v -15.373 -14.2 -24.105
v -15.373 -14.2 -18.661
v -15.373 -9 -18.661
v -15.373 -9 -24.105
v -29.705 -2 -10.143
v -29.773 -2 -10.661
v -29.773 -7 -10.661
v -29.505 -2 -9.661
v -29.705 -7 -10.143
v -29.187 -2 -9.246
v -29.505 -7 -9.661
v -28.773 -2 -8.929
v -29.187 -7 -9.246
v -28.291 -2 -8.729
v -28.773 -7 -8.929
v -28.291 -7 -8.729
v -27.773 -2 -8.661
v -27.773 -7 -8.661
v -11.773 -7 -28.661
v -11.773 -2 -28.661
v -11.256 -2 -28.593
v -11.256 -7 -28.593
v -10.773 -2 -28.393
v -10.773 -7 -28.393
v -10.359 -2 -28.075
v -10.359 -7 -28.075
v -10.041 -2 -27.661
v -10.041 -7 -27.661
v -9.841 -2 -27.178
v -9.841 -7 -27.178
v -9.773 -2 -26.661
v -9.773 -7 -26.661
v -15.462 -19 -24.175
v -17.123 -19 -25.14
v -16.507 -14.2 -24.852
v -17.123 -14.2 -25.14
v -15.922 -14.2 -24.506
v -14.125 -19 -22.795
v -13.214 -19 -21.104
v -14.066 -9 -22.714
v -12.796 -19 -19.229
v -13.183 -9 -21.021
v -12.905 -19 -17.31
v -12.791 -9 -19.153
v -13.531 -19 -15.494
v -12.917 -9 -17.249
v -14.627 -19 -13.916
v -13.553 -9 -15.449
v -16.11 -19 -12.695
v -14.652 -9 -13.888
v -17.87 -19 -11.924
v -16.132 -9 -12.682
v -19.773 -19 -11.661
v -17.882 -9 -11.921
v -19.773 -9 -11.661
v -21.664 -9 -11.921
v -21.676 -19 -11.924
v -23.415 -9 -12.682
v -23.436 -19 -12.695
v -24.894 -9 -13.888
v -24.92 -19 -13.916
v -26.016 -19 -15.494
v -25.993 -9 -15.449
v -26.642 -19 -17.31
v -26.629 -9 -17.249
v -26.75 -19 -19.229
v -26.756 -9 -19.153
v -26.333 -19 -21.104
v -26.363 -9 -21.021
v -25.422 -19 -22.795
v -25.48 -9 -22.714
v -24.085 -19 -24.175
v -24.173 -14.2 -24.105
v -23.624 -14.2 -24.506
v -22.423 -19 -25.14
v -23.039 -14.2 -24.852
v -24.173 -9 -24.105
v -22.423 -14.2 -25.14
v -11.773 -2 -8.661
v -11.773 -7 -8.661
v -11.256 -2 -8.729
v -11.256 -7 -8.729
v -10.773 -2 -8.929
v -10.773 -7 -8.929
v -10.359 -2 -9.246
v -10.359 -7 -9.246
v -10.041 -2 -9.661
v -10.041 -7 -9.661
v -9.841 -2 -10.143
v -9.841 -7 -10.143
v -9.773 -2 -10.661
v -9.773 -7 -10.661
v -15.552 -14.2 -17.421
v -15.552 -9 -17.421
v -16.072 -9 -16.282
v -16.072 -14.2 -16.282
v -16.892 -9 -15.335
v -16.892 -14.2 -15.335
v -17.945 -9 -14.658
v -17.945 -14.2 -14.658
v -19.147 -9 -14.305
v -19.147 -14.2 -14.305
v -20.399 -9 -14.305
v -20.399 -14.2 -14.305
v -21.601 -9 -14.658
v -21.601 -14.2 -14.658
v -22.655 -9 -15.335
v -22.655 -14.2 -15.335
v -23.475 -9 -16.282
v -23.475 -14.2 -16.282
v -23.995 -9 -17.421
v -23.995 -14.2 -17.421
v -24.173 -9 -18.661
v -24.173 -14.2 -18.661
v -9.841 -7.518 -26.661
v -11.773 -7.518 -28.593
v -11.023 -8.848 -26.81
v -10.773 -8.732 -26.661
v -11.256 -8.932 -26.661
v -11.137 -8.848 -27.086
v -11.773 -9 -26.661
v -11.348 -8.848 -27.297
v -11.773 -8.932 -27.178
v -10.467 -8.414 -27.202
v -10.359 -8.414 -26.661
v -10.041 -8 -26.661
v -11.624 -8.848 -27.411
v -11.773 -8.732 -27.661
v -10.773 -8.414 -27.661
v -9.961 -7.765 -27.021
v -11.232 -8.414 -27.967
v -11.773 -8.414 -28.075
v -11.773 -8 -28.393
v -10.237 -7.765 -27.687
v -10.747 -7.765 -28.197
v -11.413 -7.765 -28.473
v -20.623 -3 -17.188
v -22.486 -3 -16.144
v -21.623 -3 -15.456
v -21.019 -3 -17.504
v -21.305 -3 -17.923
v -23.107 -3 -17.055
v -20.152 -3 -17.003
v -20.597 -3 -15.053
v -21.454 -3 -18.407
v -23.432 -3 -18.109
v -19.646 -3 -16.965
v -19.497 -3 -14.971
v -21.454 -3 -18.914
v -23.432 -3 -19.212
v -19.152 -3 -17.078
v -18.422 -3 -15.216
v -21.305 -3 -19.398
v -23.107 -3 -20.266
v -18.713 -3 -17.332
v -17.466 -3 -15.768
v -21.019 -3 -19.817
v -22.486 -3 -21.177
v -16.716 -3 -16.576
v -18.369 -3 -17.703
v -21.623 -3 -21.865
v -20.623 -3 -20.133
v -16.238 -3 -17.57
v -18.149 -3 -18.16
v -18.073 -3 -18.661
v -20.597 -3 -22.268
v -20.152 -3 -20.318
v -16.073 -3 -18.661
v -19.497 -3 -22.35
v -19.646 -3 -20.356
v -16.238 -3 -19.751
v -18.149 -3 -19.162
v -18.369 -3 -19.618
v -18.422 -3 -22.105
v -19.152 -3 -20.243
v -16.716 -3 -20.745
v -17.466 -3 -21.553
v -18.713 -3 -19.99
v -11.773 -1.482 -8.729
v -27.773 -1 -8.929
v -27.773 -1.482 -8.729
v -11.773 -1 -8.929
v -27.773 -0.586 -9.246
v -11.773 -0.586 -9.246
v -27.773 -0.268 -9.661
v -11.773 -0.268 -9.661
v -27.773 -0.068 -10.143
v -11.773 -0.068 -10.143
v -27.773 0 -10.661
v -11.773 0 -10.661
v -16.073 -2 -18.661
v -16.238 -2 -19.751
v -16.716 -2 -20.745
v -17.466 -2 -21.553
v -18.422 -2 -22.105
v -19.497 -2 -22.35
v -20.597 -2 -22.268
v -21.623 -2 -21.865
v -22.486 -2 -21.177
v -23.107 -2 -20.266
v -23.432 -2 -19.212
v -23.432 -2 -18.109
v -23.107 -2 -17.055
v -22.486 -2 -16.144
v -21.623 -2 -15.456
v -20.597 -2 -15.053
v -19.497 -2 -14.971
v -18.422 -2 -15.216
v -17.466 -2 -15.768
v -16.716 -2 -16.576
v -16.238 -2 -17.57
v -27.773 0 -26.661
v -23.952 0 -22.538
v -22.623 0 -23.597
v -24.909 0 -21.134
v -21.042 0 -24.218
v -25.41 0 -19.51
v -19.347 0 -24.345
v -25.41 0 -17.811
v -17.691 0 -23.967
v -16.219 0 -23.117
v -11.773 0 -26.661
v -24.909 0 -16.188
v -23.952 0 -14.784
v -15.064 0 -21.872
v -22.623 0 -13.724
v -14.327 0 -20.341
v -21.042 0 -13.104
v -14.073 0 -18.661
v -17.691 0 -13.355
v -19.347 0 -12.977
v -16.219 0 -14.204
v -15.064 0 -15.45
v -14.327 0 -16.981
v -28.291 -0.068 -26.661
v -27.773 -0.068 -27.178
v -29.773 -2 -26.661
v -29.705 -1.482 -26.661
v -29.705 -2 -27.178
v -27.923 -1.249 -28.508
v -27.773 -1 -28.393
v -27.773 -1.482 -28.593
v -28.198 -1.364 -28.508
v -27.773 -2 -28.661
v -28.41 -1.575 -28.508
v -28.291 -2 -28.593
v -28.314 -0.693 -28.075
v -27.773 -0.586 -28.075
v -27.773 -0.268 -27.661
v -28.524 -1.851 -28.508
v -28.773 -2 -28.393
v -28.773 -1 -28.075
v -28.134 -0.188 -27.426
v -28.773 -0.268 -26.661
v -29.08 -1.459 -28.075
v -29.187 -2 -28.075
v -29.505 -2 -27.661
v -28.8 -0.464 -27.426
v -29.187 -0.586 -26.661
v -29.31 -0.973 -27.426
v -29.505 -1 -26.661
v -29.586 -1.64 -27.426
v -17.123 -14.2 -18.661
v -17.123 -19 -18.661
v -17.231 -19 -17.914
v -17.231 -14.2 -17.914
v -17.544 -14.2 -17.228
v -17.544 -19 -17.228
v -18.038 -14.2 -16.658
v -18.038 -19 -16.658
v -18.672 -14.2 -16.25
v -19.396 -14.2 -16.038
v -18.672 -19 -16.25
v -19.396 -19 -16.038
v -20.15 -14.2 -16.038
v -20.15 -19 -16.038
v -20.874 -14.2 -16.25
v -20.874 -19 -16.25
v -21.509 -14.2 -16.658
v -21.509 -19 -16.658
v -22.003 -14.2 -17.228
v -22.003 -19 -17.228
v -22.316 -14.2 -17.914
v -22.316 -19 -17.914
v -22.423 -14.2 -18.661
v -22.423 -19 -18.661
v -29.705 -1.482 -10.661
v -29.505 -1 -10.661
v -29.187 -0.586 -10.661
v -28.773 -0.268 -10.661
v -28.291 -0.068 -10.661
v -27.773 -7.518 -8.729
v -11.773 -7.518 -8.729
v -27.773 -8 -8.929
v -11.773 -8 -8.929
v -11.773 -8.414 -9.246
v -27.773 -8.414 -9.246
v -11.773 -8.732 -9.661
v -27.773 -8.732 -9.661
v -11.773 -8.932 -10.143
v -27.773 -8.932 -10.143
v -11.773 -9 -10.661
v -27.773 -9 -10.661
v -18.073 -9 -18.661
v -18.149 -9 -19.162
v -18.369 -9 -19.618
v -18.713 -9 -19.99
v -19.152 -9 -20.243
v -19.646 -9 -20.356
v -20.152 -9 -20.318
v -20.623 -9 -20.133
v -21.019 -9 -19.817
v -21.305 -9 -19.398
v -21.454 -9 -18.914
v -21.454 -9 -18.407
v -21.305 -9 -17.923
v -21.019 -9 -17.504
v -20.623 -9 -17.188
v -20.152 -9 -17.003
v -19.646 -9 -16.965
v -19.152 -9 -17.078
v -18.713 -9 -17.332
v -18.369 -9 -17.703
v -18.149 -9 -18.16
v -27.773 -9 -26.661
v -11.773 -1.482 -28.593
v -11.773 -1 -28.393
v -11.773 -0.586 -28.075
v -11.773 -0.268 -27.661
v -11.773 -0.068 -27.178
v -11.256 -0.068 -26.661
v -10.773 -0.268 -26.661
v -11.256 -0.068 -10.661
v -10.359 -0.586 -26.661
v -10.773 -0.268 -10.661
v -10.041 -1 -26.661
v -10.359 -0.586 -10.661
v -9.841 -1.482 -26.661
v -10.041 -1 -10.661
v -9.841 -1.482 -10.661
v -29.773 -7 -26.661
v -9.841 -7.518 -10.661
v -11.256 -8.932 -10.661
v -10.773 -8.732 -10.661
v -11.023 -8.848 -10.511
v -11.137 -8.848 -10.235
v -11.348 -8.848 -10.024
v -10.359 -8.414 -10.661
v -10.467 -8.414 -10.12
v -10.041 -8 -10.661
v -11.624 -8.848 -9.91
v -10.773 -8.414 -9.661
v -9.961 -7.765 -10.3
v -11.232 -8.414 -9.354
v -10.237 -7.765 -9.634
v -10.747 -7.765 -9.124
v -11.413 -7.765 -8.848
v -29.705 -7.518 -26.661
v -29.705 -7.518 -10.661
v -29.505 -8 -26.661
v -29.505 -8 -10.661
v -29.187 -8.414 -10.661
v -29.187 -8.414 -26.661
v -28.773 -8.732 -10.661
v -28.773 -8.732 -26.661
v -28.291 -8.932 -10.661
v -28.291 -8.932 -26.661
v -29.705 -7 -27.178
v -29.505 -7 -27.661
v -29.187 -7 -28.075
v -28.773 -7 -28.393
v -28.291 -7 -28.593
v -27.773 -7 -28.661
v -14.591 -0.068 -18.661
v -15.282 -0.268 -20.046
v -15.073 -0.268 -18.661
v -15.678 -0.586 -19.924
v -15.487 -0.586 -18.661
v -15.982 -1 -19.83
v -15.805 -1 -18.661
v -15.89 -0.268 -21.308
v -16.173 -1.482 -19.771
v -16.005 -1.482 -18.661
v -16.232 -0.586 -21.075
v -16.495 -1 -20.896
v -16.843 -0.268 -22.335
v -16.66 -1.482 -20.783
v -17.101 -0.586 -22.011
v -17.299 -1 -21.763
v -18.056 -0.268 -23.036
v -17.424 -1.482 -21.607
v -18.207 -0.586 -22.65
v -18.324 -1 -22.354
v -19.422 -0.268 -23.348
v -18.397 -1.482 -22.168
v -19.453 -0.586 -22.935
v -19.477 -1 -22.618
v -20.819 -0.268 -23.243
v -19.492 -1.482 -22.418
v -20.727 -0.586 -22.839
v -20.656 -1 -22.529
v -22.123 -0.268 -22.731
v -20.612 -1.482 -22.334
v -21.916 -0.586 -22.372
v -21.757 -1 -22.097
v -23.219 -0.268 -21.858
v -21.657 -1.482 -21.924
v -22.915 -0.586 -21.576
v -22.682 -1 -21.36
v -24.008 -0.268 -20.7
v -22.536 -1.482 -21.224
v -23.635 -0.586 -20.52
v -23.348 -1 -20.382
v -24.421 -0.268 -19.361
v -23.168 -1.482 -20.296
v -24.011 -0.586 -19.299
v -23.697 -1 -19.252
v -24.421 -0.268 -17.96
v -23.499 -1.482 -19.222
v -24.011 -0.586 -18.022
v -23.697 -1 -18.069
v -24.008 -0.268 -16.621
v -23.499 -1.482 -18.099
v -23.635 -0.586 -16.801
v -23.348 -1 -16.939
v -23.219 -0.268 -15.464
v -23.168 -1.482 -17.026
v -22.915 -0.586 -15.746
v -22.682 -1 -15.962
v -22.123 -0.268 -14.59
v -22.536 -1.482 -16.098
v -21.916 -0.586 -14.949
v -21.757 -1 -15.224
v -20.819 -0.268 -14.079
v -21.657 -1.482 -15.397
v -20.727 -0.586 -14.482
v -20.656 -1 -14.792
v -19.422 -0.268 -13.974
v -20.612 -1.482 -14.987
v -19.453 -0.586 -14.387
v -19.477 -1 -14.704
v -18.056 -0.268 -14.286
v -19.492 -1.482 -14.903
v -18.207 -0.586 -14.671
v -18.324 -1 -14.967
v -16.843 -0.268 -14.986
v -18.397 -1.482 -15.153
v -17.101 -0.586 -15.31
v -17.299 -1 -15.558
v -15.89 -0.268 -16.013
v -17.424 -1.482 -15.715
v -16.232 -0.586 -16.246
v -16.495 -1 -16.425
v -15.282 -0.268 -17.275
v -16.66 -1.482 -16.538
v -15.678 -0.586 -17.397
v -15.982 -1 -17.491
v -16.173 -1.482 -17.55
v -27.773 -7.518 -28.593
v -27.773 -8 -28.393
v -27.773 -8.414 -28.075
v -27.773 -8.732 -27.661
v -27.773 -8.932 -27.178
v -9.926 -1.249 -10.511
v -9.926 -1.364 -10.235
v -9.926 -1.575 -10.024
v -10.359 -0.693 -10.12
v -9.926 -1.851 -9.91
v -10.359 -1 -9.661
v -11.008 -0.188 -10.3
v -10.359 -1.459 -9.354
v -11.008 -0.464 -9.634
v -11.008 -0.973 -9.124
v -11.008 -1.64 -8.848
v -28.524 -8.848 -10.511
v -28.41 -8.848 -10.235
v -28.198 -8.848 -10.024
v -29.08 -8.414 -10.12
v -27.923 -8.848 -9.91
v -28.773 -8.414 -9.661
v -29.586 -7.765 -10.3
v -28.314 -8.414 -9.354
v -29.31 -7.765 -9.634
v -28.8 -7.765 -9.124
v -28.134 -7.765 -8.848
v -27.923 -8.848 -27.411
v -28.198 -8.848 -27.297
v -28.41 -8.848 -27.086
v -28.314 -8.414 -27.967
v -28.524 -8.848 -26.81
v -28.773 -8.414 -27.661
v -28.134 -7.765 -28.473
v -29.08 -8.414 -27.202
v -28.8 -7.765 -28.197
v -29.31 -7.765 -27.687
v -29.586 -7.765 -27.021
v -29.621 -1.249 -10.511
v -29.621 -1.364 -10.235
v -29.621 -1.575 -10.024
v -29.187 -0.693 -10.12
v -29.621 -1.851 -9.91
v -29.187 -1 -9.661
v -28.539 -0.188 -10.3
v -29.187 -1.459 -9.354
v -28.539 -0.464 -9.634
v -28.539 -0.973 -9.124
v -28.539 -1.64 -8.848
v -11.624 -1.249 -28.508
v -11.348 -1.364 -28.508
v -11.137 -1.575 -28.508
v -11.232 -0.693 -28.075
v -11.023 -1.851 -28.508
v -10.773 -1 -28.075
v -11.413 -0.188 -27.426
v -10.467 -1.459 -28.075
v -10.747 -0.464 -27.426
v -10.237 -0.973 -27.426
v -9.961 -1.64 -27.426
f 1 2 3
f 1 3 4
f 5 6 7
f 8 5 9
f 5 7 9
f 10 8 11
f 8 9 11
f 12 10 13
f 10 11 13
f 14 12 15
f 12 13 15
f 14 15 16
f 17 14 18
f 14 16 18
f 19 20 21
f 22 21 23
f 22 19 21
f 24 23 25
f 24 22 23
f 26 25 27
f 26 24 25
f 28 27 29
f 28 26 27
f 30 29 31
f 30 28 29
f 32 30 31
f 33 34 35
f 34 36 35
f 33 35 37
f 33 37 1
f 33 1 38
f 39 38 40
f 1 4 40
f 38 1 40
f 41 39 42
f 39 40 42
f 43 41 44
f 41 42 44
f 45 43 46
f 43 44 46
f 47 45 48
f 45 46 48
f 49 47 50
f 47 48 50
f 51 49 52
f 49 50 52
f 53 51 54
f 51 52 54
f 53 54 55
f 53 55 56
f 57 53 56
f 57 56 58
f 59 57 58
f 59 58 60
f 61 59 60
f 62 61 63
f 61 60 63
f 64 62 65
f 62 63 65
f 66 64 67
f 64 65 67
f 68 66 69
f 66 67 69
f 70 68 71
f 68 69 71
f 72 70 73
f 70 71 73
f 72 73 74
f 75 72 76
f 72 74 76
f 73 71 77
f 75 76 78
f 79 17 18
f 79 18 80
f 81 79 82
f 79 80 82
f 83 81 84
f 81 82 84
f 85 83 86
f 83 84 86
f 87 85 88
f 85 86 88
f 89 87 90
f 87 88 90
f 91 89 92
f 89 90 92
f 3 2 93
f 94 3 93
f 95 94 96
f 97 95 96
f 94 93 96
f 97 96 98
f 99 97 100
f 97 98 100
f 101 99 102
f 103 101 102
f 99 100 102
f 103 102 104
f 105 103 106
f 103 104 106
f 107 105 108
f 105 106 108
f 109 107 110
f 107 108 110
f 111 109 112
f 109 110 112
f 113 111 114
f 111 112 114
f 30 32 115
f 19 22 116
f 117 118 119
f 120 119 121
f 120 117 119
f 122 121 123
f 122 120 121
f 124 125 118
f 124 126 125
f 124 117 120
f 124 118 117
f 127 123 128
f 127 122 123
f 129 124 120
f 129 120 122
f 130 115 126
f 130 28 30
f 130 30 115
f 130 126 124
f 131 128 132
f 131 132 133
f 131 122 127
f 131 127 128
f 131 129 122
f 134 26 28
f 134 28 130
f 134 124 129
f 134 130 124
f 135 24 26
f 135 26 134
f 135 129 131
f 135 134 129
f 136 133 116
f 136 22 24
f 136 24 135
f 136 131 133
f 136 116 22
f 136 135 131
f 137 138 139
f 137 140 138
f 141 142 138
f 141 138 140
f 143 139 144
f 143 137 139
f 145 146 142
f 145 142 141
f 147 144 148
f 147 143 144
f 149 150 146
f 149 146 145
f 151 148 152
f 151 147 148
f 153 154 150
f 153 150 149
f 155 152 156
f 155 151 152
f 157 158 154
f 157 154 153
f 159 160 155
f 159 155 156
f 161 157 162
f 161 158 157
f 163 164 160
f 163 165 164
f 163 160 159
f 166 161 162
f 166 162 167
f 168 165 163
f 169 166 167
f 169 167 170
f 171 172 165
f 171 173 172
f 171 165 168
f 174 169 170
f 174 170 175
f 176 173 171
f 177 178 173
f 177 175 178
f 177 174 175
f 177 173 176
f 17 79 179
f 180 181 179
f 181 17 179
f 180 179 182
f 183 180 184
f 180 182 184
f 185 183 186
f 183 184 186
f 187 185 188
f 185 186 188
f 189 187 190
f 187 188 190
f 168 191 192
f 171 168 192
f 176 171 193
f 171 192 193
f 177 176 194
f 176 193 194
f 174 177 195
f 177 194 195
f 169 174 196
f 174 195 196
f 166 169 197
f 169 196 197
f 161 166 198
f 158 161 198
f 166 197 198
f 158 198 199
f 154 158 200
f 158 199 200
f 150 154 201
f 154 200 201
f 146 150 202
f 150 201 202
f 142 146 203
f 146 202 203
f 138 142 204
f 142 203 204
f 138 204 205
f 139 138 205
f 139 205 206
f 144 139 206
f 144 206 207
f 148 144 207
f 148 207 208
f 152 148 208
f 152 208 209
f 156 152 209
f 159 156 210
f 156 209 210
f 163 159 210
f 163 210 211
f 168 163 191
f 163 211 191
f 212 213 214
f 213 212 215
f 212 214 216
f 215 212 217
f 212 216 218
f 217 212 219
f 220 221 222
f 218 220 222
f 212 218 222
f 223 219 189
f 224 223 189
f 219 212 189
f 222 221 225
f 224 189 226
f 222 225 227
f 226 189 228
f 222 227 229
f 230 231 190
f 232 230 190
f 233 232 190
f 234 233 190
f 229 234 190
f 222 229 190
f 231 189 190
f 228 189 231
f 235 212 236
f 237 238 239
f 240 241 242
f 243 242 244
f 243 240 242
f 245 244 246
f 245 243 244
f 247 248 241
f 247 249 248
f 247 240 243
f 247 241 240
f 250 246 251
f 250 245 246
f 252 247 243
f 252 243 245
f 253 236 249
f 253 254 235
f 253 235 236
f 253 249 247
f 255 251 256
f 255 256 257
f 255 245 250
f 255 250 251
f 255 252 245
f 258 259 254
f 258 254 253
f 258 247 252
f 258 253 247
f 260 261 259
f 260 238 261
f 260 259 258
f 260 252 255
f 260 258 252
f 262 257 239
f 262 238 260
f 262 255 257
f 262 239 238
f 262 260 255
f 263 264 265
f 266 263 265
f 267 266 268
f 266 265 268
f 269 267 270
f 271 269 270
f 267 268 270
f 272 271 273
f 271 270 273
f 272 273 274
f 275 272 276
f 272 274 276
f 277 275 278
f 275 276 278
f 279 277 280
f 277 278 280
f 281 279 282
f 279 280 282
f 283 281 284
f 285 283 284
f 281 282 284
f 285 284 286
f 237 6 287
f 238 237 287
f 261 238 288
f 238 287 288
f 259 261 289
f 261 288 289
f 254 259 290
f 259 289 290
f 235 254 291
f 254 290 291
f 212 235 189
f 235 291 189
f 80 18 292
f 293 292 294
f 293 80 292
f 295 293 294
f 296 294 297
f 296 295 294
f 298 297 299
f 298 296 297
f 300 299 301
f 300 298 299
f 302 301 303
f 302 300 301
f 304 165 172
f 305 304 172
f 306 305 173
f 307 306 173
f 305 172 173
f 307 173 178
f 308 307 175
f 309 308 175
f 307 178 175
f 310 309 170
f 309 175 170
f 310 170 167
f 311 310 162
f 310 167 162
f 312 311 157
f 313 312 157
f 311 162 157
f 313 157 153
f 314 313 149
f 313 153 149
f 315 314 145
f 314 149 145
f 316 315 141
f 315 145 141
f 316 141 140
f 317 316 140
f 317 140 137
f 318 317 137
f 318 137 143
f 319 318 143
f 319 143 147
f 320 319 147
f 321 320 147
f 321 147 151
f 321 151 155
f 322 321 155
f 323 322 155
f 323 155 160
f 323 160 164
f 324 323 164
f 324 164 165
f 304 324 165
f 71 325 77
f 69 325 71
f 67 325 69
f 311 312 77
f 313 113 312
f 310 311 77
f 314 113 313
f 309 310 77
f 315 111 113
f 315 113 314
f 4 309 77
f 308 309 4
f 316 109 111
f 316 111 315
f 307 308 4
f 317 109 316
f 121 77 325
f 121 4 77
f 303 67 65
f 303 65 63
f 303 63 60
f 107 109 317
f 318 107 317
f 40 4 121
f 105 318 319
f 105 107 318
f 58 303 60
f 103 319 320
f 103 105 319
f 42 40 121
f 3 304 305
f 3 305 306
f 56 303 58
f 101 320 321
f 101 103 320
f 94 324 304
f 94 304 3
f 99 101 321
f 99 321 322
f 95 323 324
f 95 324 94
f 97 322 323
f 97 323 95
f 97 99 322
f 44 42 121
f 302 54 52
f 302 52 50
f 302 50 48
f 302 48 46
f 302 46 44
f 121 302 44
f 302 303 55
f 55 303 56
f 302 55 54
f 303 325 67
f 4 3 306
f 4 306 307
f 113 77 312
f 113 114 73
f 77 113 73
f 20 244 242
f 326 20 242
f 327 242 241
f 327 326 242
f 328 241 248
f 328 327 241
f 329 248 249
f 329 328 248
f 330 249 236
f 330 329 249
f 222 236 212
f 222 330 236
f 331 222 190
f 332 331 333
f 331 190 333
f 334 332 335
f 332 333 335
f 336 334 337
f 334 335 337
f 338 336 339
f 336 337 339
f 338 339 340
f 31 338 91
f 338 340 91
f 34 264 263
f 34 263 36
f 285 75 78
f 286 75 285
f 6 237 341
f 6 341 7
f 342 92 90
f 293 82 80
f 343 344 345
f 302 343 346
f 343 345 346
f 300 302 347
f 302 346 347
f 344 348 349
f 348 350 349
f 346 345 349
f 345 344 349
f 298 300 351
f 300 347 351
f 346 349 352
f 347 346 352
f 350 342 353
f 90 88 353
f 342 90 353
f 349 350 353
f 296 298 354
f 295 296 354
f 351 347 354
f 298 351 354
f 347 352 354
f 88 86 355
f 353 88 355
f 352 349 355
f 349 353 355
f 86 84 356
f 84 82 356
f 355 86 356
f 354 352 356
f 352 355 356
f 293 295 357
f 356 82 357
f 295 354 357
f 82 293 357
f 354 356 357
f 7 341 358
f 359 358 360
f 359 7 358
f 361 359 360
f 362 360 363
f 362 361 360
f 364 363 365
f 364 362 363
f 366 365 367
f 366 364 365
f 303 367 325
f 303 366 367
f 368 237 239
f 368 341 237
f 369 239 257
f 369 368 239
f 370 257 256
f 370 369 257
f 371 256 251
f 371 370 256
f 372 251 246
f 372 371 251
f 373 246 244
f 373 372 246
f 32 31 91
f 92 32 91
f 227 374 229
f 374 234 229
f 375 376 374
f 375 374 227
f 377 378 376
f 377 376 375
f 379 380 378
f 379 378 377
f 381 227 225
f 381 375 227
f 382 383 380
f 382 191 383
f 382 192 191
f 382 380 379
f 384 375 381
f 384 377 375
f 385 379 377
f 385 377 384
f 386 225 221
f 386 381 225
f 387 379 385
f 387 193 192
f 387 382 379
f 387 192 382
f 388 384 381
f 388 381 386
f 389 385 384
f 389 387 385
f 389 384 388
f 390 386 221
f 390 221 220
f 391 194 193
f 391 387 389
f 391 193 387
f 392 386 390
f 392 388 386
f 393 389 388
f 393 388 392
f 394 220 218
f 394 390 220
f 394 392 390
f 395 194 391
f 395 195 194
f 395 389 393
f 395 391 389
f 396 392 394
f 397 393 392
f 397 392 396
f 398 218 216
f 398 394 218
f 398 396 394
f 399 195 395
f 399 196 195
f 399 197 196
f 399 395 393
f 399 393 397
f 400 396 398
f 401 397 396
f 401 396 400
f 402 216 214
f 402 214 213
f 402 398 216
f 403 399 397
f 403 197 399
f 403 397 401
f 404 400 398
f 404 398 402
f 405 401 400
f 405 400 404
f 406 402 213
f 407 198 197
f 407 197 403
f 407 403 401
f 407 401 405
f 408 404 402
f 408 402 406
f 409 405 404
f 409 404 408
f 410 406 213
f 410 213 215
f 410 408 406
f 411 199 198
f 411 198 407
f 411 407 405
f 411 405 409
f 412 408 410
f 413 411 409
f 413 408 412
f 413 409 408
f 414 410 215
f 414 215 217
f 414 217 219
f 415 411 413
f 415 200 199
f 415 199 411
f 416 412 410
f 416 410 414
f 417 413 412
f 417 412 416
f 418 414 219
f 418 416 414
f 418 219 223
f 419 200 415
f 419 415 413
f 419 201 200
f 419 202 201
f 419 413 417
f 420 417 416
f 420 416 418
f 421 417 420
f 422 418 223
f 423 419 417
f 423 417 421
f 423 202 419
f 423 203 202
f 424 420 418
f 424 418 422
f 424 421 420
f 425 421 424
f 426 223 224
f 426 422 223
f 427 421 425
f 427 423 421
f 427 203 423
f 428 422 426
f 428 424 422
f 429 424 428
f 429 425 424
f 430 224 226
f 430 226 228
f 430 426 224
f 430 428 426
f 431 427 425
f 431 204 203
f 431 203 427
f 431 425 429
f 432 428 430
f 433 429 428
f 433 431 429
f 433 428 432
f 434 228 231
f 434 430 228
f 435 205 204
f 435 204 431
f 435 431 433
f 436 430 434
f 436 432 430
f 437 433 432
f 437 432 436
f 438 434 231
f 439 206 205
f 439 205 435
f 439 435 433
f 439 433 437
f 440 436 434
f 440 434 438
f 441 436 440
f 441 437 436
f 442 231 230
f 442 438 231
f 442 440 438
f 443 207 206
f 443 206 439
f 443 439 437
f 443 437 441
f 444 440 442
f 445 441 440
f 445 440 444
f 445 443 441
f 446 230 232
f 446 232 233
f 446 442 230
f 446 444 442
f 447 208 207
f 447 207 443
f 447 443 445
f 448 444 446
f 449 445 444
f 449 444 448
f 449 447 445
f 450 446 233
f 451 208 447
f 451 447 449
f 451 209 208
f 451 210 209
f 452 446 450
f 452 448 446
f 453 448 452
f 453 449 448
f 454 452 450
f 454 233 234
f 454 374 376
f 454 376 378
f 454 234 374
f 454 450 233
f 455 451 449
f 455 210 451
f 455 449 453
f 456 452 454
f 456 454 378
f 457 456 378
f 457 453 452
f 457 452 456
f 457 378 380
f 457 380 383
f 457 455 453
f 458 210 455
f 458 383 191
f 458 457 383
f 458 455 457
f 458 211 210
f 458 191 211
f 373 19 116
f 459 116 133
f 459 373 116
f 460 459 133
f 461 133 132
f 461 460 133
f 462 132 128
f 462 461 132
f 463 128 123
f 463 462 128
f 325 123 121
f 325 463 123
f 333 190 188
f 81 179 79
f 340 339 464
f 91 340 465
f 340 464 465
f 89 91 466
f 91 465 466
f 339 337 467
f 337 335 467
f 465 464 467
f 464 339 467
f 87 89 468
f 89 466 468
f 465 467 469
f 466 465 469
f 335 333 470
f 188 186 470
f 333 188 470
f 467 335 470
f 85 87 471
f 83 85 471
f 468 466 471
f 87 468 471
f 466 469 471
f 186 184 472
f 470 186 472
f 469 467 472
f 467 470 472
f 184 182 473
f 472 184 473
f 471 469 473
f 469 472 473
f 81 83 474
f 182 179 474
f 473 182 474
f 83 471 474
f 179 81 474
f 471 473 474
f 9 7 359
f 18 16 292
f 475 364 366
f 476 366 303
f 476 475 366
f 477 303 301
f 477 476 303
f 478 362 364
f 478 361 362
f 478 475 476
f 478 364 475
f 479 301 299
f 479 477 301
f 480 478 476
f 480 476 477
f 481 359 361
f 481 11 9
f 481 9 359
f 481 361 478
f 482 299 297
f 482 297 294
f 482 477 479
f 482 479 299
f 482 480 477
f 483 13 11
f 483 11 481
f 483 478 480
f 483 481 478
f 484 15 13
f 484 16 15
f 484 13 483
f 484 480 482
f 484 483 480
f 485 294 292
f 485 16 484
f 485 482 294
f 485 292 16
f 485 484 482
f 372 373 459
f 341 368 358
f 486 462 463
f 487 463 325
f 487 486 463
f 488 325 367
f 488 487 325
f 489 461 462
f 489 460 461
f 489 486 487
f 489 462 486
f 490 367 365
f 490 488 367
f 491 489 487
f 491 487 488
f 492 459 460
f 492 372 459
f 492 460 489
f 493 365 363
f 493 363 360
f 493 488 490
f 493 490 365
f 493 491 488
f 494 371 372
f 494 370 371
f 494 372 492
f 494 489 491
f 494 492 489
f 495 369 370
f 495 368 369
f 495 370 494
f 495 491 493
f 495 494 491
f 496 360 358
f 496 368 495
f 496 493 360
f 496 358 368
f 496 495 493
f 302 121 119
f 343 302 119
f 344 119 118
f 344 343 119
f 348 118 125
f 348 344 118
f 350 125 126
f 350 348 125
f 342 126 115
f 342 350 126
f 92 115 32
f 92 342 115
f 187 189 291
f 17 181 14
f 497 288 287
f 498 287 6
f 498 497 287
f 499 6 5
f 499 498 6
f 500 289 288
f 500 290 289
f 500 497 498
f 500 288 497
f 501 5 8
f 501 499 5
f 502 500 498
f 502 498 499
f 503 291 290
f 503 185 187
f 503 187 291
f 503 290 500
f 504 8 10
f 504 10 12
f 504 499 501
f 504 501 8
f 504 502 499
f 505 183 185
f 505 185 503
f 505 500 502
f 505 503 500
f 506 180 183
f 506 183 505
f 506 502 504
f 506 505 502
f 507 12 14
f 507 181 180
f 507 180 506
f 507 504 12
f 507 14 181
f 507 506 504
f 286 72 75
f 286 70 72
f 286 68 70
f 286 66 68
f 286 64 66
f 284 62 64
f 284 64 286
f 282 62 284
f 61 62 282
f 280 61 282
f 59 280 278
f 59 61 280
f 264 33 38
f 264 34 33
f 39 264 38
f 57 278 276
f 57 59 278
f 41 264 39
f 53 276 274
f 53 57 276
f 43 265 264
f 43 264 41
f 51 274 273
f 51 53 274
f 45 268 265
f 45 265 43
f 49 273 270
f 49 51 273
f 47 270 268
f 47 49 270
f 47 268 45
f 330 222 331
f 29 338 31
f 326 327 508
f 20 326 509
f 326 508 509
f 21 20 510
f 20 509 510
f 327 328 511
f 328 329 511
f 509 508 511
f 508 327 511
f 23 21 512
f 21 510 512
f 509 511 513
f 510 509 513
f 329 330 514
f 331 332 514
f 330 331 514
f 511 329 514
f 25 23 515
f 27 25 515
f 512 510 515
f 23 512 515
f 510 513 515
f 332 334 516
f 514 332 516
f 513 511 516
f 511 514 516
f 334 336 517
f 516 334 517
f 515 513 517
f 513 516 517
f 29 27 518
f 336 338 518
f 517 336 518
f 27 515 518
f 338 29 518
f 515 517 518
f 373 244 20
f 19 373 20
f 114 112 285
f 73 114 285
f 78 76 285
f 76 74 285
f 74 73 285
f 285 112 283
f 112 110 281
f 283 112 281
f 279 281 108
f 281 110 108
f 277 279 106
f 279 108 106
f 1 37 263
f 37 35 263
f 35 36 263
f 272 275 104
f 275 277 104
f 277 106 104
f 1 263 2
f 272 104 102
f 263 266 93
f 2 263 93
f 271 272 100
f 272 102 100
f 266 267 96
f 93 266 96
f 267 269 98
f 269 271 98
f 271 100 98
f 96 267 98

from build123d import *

# Parameters (mm, degrees)
SKETCH042_W     = 20
SKETCH042_H     = 20
PAD022_DEPTH    = 9
SKETCH043_R     = 7
PAD023_DEPTH    = 10
POCKET023_DEPTH = 8
SKETCH046_W     = 8.75
SKETCH046_H     = 5.2
POCKET024_DEPTH = 1
SKETCH047_R     = 3.7
POCKET025_DEPTH = 3
SKETCH048_R     = 1.675
POCKET026_DEPTH = 5
FILLET007_R     = 2
POCKET033_DEPTH = 5.2
SKETCH058_R     = 1.7
POCKET034_DEPTH = 10


with BuildPart() as part:
    # Sketch042 → Pad022 (new body)
    with BuildSketch(Plane.XZ):
        with Locations((-19.773271, -18.660706)):
            Rectangle(SKETCH042_W, SKETCH042_H)
    extrude(amount=PAD022_DEPTH)

    # Sketch043 (on Face6 of Pad022) → Pad023 (join)
    with BuildSketch(Plane.XZ.offset(9)):
        with Locations((-19.773271, -18.660706)):
            Circle(SKETCH043_R)
    extrude(amount=PAD023_DEPTH)

    # Sketch044 (on Face8 of Pad023) → Pocket023 (cut)
    with BuildSketch(Plane.XZ.offset(19)):
        with BuildLine():
            Line((-17.123271, -18.660706), (-17.123271, -31.745383))
            Line((-17.123271, -31.745383), (-22.423271, -31.745383))
            Line((-22.423271, -31.745383), (-22.423271, -18.660706))
            ThreePointArc((-17.123271, -18.660706), (-19.773271, -16.010706), (-22.423271, -18.660706))
        make_face()
    extrude(amount=-POCKET023_DEPTH, mode=Mode.SUBTRACT)

    # Sketch046 (on Face6 of Pocket023) → Pocket024 (cut)
    with BuildSketch(Plane(origin=(0, 0, -28.660706), x_dir=(1, 0, 0), z_dir=(0, 0, -1))):
        with Locations((-19.773271, 11.6)):
            Rectangle(SKETCH046_W, SKETCH046_H)
    extrude(amount=-POCKET024_DEPTH, mode=Mode.SUBTRACT)

    # Sketch047 (on Face4 of Pocket024) → Pocket025 (cut)
    with BuildSketch(Plane(origin=(0, 0, 0), x_dir=(1, 0, 0), z_dir=(0, 1, 0))):
        with Locations((-19.773271, 18.660706)):
            Circle(SKETCH047_R)
    extrude(amount=-POCKET025_DEPTH, mode=Mode.SUBTRACT)

    # Sketch048 (on Face11 of Pocket025) → Pocket026 (cut)
    with BuildSketch(Plane.XZ.offset(19)):
        with Locations((-19.773271, -18.660706)):
            Circle(SKETCH048_R)
    extrude(amount=-POCKET026_DEPTH, mode=Mode.SUBTRACT)

    # Fillet007
    fillet007_edges = [part.edges().sort_by_distance(p)[0] for p in [
        (-19.773271, 0, -8.660706),
        (-9.773271, 0, -18.660706),
        (-29.773271, 0, -18.660706),
        (-19.773271, 0, -28.660706),
        (-23.473271, 0, -18.660706),
        (-9.773271, -4.5, -28.660706),
        (-9.773271, -4.5, -8.660706),
        (-9.773271, -9, -18.660706),
        (-29.773271, -4.5, -28.660706),
        (-26.960771, -9, -28.660706),
        (-19.773271, -9, -28.660706),
        (-12.585771, -9, -28.660706),
        (-29.773271, -4.5, -8.660706),
        (-29.773271, -9, -18.660706),
        (-19.773271, -9, -8.660706),
    ]]
    fillet(fillet007_edges, radius=FILLET007_R)

    # Sketch057 (on Face32 of Fillet007) → Pocket033 (cut)
    with BuildSketch(Plane.XZ.offset(14.2)):
        with BuildLine():
            ThreePointArc((-15.373271, -18.660706), (-19.773271, -14.260706), (-24.173271, -18.660706))
            Line((-24.173271, -18.660706), (-24.173271, -31.35503))
            Line((-24.173271, -31.35503), (-15.373271, -31.35503))
            Line((-15.373271, -18.660706), (-15.373271, -31.35503))
        make_face()
    extrude(amount=-POCKET033_DEPTH, mode=Mode.SUBTRACT)

    # Sketch058 (on Face41 of Pocket033) → Pocket034 (cut)
    with BuildSketch(Plane(origin=(0, -3, 0), x_dir=(1, 0, 0), z_dir=(0, 1, 0))):
        with Locations((-19.773271, 18.660706)):
            Circle(SKETCH058_R)
    extrude(amount=-POCKET034_DEPTH, mode=Mode.SUBTRACT)


solid = part.part
